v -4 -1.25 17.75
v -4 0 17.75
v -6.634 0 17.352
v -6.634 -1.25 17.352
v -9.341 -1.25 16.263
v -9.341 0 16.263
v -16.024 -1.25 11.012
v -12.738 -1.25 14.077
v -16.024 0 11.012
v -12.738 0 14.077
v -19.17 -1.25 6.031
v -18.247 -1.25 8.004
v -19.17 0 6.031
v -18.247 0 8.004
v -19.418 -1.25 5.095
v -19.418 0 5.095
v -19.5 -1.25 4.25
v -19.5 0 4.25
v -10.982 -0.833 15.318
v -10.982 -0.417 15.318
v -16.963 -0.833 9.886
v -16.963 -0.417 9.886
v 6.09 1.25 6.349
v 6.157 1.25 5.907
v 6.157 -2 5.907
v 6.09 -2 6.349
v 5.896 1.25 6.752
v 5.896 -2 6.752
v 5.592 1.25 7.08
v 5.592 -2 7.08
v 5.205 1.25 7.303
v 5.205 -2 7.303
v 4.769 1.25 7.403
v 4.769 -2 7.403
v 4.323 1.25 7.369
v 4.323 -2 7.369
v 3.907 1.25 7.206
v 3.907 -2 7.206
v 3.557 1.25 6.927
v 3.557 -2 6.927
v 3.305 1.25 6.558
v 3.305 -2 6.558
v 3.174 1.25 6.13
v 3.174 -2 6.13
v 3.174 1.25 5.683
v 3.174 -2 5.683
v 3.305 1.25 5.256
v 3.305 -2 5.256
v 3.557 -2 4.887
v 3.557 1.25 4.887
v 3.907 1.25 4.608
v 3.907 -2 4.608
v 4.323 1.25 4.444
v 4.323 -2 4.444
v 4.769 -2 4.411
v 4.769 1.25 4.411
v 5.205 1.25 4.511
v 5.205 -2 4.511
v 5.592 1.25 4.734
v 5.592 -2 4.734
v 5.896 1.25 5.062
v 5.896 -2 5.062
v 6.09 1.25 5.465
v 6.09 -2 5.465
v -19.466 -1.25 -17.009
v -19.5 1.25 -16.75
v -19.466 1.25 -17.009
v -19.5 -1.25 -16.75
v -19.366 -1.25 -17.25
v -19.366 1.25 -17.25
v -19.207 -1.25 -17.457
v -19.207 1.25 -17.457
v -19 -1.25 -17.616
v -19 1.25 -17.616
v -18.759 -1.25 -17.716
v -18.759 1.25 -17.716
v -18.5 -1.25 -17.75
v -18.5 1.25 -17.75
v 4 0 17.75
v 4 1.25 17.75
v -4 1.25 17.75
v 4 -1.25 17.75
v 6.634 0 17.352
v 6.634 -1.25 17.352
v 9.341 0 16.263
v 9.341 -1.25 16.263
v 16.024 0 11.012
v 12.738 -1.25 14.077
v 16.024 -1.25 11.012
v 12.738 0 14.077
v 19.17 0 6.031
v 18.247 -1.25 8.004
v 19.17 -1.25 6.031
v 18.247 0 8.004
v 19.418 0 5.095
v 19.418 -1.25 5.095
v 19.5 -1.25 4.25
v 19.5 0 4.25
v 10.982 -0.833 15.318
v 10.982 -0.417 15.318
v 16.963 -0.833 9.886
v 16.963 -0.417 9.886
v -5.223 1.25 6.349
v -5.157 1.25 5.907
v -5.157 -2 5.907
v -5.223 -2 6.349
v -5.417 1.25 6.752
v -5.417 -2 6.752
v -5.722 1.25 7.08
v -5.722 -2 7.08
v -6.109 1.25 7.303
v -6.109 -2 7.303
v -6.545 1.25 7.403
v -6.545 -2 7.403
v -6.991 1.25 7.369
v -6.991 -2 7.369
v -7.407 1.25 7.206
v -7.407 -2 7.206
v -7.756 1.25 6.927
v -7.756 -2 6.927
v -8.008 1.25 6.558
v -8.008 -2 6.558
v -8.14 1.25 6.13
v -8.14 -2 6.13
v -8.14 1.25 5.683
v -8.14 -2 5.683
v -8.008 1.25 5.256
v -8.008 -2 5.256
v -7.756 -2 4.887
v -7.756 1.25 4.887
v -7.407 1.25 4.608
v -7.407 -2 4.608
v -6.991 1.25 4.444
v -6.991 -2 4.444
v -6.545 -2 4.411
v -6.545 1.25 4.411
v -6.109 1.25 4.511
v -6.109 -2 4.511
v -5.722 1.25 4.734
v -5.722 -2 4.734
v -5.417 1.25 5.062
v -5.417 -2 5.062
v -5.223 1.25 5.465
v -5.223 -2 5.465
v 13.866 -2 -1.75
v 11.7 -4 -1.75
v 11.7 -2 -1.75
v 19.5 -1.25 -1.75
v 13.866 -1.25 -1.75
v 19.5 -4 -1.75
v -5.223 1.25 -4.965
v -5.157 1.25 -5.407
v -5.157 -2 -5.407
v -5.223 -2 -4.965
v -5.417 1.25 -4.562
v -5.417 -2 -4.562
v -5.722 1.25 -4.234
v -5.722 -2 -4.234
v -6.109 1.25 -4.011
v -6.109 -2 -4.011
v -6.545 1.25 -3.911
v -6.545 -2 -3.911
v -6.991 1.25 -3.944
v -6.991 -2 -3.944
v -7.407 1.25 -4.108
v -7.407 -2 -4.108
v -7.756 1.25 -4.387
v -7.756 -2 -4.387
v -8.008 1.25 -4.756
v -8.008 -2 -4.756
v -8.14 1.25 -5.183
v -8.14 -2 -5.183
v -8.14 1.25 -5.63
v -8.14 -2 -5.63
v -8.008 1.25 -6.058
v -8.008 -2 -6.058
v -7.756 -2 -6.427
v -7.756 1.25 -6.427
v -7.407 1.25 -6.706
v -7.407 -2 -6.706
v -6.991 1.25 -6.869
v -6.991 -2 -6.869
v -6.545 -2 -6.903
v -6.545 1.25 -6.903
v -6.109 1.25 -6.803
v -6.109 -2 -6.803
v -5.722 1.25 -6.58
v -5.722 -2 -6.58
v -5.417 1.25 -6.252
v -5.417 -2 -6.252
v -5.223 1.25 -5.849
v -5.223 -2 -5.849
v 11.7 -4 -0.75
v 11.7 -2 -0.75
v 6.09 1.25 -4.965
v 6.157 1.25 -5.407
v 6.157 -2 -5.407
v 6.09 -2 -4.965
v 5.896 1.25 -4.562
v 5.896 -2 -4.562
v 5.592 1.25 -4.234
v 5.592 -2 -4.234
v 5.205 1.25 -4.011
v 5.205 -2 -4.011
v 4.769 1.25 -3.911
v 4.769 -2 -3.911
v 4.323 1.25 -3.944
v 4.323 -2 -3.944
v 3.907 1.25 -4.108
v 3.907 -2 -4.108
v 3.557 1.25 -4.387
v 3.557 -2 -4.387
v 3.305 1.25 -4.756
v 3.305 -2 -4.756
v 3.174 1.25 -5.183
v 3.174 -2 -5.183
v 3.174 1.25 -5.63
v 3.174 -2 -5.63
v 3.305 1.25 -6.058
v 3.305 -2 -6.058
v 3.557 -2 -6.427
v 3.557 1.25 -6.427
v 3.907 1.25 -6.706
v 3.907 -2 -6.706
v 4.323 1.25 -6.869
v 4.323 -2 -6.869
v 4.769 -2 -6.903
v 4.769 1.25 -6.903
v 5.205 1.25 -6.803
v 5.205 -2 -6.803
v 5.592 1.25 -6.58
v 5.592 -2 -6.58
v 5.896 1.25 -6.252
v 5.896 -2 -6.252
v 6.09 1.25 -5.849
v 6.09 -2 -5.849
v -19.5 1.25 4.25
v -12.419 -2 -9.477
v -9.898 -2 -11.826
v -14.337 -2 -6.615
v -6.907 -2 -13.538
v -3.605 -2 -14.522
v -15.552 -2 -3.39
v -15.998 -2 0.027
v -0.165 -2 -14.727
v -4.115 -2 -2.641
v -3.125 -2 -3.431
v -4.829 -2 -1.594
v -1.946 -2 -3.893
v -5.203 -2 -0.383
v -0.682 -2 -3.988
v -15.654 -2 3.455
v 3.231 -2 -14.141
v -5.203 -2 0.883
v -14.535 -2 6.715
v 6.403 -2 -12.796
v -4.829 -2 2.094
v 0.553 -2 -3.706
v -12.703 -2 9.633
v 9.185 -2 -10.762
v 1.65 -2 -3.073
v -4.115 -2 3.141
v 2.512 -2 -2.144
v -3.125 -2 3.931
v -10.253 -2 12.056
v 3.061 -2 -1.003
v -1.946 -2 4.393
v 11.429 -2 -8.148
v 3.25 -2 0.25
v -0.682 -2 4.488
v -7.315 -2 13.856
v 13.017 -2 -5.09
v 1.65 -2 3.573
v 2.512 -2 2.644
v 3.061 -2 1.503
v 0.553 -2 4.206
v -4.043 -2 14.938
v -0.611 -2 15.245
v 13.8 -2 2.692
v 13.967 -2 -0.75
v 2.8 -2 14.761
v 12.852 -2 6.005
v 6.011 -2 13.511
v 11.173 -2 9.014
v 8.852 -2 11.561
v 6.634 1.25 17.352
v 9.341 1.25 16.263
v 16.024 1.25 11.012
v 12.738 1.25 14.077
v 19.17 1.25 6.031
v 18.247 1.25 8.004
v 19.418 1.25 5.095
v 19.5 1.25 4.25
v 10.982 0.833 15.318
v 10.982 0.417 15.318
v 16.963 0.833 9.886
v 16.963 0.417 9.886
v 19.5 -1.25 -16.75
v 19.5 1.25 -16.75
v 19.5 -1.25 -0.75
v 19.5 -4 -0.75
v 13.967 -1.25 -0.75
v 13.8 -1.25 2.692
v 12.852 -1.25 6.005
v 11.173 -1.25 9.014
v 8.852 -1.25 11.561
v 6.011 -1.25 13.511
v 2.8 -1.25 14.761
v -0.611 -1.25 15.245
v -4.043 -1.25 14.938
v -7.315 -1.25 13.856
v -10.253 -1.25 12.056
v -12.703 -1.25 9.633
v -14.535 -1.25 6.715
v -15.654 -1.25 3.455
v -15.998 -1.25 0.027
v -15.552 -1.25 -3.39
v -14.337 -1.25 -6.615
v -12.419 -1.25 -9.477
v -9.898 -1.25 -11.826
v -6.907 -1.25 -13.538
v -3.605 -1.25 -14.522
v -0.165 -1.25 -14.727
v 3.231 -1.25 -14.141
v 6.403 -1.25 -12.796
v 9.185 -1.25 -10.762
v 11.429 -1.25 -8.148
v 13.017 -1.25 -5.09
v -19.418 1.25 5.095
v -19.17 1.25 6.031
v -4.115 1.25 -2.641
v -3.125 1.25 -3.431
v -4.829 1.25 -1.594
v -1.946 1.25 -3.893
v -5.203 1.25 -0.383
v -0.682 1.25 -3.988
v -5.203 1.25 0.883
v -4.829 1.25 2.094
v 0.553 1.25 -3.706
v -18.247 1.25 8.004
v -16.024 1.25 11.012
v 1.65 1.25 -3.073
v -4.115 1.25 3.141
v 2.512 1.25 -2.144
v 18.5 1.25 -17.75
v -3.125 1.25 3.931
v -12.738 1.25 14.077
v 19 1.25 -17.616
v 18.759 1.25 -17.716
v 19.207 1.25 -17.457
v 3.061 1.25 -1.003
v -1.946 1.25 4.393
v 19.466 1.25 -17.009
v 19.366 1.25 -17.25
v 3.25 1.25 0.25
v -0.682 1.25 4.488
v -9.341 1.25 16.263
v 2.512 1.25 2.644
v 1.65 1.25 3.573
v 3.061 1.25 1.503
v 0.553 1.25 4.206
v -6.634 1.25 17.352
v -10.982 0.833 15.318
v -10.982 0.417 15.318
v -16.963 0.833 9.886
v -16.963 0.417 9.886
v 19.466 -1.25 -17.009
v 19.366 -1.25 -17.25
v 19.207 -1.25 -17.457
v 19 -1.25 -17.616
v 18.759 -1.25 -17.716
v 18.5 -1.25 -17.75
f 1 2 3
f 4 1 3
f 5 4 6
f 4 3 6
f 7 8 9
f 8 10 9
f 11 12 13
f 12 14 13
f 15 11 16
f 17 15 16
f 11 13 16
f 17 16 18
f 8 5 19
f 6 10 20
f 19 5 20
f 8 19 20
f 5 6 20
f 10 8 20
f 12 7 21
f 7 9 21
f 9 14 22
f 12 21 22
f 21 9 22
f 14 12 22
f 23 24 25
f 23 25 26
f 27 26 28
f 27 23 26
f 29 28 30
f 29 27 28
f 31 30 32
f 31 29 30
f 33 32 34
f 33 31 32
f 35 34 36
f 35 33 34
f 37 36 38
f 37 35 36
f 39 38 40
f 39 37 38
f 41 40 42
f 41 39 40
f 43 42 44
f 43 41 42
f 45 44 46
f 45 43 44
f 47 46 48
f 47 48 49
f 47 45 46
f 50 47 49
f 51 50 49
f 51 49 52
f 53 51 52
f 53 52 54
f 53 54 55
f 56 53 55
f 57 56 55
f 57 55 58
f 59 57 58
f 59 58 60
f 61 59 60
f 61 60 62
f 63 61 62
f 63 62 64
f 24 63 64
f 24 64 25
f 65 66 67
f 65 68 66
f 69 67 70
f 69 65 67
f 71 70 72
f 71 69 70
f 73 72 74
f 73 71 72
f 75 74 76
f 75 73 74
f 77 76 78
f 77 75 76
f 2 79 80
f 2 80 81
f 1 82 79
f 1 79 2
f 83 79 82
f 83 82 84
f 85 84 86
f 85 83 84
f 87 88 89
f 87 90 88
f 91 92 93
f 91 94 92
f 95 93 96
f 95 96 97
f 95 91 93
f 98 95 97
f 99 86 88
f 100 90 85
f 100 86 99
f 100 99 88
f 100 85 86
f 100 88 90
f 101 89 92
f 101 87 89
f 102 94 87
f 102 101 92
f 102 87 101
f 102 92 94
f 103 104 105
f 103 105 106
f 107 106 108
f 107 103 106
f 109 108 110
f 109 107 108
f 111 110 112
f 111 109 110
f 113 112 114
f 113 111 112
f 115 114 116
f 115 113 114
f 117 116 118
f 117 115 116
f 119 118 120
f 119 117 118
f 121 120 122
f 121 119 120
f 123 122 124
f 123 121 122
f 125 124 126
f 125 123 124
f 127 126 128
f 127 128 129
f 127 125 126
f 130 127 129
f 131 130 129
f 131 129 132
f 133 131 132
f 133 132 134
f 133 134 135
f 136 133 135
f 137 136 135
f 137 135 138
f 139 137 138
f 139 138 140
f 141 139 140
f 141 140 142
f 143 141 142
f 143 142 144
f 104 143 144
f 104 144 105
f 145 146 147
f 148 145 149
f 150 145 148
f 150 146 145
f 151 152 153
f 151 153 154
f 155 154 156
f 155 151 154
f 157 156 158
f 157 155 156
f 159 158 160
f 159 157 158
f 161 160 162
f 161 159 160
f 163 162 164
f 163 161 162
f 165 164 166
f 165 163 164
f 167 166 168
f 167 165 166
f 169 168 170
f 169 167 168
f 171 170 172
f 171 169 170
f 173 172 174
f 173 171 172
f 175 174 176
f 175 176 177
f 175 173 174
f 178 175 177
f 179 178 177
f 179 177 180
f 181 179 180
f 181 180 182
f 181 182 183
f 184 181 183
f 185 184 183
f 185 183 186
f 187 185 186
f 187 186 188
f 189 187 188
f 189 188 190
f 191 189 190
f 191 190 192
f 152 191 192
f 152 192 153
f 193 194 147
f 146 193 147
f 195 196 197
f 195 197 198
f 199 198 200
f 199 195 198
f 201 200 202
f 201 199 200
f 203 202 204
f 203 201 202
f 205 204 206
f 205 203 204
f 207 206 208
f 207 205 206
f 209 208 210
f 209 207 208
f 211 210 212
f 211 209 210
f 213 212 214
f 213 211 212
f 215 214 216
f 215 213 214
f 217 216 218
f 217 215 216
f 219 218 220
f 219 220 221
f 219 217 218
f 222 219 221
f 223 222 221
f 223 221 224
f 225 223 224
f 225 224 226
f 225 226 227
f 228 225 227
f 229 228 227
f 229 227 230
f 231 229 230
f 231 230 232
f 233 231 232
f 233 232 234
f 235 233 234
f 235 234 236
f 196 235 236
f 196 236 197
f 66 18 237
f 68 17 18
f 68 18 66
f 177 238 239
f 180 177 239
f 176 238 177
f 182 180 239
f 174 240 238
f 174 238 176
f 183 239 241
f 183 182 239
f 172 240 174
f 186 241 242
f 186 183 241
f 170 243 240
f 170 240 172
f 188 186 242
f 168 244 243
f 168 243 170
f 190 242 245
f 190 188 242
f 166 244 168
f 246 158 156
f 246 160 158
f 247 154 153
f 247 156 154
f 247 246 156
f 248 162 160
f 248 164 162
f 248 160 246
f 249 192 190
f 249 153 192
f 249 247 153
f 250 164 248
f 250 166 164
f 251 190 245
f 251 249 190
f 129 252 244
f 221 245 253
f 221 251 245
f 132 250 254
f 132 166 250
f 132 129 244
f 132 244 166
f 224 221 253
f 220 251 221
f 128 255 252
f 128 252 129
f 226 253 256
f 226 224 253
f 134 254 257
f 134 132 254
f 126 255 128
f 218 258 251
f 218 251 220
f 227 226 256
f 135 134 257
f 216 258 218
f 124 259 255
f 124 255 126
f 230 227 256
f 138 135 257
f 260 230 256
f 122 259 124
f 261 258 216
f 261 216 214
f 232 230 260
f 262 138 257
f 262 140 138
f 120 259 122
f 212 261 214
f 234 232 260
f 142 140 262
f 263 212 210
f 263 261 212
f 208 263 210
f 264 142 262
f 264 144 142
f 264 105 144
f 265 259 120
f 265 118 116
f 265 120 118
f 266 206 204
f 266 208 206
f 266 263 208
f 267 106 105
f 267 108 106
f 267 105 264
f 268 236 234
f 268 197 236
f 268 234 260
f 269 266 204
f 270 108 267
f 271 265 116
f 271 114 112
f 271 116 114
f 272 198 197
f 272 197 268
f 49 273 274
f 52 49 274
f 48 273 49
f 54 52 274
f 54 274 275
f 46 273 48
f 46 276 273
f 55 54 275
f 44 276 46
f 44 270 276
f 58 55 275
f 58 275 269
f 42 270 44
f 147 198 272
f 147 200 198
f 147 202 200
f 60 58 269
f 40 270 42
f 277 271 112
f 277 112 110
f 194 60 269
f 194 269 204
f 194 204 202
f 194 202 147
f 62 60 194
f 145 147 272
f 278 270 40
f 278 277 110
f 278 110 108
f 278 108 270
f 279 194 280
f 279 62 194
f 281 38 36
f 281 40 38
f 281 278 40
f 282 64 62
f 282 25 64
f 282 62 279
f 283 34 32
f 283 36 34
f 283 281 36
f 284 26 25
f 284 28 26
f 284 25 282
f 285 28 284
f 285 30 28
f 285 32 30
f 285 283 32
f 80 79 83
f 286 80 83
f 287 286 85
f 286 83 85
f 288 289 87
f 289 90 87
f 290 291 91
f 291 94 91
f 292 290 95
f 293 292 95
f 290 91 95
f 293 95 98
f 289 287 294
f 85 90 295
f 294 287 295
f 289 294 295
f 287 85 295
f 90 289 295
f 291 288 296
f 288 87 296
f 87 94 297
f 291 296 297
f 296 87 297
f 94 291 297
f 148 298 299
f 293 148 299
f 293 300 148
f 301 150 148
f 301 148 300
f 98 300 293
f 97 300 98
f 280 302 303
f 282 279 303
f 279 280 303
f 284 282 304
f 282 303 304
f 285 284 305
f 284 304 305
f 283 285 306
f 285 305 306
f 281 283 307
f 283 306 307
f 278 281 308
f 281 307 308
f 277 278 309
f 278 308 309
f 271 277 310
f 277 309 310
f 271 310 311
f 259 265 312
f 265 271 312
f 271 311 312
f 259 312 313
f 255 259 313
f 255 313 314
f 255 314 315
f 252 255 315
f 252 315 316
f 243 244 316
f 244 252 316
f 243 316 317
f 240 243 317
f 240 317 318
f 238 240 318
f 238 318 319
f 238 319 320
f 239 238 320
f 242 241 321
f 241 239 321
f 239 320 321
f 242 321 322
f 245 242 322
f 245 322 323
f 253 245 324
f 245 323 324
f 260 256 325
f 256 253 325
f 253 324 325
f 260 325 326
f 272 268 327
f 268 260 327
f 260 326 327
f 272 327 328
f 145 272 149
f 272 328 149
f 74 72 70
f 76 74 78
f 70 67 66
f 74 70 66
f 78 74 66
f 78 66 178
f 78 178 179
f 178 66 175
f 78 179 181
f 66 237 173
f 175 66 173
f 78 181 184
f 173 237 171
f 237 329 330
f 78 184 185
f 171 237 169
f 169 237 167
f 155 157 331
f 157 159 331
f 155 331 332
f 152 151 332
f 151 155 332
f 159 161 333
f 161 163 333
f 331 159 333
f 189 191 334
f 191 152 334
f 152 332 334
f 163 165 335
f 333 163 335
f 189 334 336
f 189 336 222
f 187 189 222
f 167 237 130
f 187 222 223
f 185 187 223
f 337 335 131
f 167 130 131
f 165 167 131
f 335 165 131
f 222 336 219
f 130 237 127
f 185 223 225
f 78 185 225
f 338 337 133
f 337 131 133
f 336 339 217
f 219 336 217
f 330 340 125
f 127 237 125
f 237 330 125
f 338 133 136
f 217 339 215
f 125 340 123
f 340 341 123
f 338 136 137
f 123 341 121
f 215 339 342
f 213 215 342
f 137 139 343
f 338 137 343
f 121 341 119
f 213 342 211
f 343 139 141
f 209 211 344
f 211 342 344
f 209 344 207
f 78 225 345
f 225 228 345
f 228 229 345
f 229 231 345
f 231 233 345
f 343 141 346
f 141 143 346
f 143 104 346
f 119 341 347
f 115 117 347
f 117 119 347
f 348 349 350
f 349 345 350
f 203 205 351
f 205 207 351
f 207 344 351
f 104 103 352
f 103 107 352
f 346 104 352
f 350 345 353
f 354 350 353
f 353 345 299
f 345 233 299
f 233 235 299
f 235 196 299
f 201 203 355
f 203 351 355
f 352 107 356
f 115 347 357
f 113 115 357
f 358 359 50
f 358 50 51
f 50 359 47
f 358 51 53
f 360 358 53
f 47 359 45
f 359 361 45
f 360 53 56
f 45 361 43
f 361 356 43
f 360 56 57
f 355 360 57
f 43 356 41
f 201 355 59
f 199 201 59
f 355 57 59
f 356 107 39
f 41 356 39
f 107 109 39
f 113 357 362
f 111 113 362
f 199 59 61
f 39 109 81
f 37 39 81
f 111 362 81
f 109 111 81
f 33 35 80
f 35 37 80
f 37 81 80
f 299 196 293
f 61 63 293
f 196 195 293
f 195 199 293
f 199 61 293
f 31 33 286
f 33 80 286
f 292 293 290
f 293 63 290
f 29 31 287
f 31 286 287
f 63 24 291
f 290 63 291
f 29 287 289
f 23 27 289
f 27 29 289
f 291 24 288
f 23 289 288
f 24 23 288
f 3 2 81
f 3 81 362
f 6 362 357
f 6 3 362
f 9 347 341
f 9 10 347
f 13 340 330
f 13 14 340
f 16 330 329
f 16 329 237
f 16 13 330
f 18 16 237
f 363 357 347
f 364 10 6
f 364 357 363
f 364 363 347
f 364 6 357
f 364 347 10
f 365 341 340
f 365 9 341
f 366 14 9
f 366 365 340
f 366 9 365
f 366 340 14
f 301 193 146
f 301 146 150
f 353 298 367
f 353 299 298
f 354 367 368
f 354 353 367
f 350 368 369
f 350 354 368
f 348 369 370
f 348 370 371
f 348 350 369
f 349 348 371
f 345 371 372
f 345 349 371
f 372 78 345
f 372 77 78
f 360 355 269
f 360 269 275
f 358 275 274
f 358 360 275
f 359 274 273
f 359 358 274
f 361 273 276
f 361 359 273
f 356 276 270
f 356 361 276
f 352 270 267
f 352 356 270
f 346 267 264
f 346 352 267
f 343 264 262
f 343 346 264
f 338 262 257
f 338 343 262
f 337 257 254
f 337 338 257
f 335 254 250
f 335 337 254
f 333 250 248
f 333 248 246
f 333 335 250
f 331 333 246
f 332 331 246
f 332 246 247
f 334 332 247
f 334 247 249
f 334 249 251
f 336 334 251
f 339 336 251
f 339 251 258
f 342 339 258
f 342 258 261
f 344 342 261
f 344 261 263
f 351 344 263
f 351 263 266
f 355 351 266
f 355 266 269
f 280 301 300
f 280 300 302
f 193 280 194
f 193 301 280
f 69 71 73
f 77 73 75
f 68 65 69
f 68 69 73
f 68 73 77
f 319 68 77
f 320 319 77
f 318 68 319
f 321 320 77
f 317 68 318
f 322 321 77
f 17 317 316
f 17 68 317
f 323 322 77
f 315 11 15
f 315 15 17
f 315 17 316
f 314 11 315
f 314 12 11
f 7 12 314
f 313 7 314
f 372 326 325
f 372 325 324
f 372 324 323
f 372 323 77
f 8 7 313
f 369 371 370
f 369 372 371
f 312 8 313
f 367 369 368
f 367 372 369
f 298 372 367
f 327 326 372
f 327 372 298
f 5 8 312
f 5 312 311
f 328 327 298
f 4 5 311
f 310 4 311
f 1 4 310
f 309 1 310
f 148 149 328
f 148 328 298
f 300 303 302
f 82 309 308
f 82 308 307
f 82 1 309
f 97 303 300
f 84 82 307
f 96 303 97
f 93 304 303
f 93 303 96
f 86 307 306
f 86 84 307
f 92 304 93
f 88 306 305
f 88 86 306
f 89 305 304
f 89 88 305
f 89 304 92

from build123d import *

# Parameters (mm, degrees)
F0_R          = 1.5
F0_R_2        = 4.25
F1_DEPTH      = 1.25
F2_R          = 15
F2_R_2        = 1.5
F2_R_3        = 4.25
F3_DEPTH      = 2
F5_DEPTH      = 2
F5_DEPTH_BACK = 0.75
F6_R          = 1


with BuildPart() as f1:
    # F0 (on Front) → F1 (new body, symmetric)
    with BuildSketch(Plane.XZ):
        with BuildLine():
            Line((4, 17.75), (0, 17.75))
            Line((0, 17.75), (-4, 17.75))
            add(Edge.make_bspline(
                [(-4, 17.75), (-10.6686704129, 17.75), (-19.5, 9.0568709765), (-19.5, 4.25)],
                knots=[0, 0, 0, 0, 20.5548047911, 20.5548047911, 20.5548047911, 20.5548047911], degree=3))
            Line((-19.5, 4.25), (-19.5, -17.75))
            Line((-19.5, -17.75), (19.5, -17.75))
            Line((19.5, -17.75), (19.5, 4.25))
            add(Edge.make_bspline(
                [(4, 17.75), (10.6686704129, 17.75), (19.5, 9.0568709765), (19.5, 4.25)],
                knots=[0, 0, 0, 0, 20.5548047911, 20.5548047911, 20.5548047911, 20.5548047911], degree=3))
        make_face()
        with Locations((-6.6568542495, -5.4068542495)):
            Circle(F0_R, mode=Mode.SUBTRACT)
        with Locations((4.6568542495, -5.4068542495)):
            Circle(F0_R, mode=Mode.SUBTRACT)
        with Locations((-1, 0.25)):
            Circle(F0_R_2, mode=Mode.SUBTRACT)
        with Locations((-6.6568542495, 5.9068542495)):
            Circle(F0_R, mode=Mode.SUBTRACT)
        with Locations((4.6568542495, 5.9068542495)):
            Circle(F0_R, mode=Mode.SUBTRACT)
    extrude(amount=F1_DEPTH, both=True)

    # F2 (on Front) → F3 (join)
    with BuildSketch(Plane.XZ):
        with Locations((-1, 0.25)):
            Circle(F2_R)
        with Locations((-6.6568542495, -5.4068542495)):
            Circle(F2_R_2, mode=Mode.SUBTRACT)
        with Locations((4.6568542495, -5.4068542495)):
            Circle(F2_R_2, mode=Mode.SUBTRACT)
        with Locations((-6.6568542495, 5.9068542495)):
            Circle(F2_R_2, mode=Mode.SUBTRACT)
        with Locations((-1, 0.25)):
            Circle(F2_R_3, mode=Mode.SUBTRACT)
        with Locations((4.6568542495, 5.9068542495)):
            Circle(F2_R_2, mode=Mode.SUBTRACT)
    extrude(amount=F3_DEPTH)

    # F4 (on face) → F5 (join, two sides)
    with BuildSketch(Plane.XZ.offset(2)) as f5_sk:
        Polygon((19.5, -1.75), (19.5, -1.25), (19.5, -0.75), (11.7, -0.75), (11.7, -1.25), (11.7, -1.75), align=None)
    extrude(amount=F5_DEPTH)
    extrude(f5_sk.sketch, amount=-F5_DEPTH_BACK)

    # F6
    f6_edges = [f1.edges().sort_by_distance(p)[0] for p in [
        (19.5, 0, -17.75),
        (-19.5, 0, -17.75),
    ]]
    fillet(f6_edges, radius=F6_R)


solid = f1.part
